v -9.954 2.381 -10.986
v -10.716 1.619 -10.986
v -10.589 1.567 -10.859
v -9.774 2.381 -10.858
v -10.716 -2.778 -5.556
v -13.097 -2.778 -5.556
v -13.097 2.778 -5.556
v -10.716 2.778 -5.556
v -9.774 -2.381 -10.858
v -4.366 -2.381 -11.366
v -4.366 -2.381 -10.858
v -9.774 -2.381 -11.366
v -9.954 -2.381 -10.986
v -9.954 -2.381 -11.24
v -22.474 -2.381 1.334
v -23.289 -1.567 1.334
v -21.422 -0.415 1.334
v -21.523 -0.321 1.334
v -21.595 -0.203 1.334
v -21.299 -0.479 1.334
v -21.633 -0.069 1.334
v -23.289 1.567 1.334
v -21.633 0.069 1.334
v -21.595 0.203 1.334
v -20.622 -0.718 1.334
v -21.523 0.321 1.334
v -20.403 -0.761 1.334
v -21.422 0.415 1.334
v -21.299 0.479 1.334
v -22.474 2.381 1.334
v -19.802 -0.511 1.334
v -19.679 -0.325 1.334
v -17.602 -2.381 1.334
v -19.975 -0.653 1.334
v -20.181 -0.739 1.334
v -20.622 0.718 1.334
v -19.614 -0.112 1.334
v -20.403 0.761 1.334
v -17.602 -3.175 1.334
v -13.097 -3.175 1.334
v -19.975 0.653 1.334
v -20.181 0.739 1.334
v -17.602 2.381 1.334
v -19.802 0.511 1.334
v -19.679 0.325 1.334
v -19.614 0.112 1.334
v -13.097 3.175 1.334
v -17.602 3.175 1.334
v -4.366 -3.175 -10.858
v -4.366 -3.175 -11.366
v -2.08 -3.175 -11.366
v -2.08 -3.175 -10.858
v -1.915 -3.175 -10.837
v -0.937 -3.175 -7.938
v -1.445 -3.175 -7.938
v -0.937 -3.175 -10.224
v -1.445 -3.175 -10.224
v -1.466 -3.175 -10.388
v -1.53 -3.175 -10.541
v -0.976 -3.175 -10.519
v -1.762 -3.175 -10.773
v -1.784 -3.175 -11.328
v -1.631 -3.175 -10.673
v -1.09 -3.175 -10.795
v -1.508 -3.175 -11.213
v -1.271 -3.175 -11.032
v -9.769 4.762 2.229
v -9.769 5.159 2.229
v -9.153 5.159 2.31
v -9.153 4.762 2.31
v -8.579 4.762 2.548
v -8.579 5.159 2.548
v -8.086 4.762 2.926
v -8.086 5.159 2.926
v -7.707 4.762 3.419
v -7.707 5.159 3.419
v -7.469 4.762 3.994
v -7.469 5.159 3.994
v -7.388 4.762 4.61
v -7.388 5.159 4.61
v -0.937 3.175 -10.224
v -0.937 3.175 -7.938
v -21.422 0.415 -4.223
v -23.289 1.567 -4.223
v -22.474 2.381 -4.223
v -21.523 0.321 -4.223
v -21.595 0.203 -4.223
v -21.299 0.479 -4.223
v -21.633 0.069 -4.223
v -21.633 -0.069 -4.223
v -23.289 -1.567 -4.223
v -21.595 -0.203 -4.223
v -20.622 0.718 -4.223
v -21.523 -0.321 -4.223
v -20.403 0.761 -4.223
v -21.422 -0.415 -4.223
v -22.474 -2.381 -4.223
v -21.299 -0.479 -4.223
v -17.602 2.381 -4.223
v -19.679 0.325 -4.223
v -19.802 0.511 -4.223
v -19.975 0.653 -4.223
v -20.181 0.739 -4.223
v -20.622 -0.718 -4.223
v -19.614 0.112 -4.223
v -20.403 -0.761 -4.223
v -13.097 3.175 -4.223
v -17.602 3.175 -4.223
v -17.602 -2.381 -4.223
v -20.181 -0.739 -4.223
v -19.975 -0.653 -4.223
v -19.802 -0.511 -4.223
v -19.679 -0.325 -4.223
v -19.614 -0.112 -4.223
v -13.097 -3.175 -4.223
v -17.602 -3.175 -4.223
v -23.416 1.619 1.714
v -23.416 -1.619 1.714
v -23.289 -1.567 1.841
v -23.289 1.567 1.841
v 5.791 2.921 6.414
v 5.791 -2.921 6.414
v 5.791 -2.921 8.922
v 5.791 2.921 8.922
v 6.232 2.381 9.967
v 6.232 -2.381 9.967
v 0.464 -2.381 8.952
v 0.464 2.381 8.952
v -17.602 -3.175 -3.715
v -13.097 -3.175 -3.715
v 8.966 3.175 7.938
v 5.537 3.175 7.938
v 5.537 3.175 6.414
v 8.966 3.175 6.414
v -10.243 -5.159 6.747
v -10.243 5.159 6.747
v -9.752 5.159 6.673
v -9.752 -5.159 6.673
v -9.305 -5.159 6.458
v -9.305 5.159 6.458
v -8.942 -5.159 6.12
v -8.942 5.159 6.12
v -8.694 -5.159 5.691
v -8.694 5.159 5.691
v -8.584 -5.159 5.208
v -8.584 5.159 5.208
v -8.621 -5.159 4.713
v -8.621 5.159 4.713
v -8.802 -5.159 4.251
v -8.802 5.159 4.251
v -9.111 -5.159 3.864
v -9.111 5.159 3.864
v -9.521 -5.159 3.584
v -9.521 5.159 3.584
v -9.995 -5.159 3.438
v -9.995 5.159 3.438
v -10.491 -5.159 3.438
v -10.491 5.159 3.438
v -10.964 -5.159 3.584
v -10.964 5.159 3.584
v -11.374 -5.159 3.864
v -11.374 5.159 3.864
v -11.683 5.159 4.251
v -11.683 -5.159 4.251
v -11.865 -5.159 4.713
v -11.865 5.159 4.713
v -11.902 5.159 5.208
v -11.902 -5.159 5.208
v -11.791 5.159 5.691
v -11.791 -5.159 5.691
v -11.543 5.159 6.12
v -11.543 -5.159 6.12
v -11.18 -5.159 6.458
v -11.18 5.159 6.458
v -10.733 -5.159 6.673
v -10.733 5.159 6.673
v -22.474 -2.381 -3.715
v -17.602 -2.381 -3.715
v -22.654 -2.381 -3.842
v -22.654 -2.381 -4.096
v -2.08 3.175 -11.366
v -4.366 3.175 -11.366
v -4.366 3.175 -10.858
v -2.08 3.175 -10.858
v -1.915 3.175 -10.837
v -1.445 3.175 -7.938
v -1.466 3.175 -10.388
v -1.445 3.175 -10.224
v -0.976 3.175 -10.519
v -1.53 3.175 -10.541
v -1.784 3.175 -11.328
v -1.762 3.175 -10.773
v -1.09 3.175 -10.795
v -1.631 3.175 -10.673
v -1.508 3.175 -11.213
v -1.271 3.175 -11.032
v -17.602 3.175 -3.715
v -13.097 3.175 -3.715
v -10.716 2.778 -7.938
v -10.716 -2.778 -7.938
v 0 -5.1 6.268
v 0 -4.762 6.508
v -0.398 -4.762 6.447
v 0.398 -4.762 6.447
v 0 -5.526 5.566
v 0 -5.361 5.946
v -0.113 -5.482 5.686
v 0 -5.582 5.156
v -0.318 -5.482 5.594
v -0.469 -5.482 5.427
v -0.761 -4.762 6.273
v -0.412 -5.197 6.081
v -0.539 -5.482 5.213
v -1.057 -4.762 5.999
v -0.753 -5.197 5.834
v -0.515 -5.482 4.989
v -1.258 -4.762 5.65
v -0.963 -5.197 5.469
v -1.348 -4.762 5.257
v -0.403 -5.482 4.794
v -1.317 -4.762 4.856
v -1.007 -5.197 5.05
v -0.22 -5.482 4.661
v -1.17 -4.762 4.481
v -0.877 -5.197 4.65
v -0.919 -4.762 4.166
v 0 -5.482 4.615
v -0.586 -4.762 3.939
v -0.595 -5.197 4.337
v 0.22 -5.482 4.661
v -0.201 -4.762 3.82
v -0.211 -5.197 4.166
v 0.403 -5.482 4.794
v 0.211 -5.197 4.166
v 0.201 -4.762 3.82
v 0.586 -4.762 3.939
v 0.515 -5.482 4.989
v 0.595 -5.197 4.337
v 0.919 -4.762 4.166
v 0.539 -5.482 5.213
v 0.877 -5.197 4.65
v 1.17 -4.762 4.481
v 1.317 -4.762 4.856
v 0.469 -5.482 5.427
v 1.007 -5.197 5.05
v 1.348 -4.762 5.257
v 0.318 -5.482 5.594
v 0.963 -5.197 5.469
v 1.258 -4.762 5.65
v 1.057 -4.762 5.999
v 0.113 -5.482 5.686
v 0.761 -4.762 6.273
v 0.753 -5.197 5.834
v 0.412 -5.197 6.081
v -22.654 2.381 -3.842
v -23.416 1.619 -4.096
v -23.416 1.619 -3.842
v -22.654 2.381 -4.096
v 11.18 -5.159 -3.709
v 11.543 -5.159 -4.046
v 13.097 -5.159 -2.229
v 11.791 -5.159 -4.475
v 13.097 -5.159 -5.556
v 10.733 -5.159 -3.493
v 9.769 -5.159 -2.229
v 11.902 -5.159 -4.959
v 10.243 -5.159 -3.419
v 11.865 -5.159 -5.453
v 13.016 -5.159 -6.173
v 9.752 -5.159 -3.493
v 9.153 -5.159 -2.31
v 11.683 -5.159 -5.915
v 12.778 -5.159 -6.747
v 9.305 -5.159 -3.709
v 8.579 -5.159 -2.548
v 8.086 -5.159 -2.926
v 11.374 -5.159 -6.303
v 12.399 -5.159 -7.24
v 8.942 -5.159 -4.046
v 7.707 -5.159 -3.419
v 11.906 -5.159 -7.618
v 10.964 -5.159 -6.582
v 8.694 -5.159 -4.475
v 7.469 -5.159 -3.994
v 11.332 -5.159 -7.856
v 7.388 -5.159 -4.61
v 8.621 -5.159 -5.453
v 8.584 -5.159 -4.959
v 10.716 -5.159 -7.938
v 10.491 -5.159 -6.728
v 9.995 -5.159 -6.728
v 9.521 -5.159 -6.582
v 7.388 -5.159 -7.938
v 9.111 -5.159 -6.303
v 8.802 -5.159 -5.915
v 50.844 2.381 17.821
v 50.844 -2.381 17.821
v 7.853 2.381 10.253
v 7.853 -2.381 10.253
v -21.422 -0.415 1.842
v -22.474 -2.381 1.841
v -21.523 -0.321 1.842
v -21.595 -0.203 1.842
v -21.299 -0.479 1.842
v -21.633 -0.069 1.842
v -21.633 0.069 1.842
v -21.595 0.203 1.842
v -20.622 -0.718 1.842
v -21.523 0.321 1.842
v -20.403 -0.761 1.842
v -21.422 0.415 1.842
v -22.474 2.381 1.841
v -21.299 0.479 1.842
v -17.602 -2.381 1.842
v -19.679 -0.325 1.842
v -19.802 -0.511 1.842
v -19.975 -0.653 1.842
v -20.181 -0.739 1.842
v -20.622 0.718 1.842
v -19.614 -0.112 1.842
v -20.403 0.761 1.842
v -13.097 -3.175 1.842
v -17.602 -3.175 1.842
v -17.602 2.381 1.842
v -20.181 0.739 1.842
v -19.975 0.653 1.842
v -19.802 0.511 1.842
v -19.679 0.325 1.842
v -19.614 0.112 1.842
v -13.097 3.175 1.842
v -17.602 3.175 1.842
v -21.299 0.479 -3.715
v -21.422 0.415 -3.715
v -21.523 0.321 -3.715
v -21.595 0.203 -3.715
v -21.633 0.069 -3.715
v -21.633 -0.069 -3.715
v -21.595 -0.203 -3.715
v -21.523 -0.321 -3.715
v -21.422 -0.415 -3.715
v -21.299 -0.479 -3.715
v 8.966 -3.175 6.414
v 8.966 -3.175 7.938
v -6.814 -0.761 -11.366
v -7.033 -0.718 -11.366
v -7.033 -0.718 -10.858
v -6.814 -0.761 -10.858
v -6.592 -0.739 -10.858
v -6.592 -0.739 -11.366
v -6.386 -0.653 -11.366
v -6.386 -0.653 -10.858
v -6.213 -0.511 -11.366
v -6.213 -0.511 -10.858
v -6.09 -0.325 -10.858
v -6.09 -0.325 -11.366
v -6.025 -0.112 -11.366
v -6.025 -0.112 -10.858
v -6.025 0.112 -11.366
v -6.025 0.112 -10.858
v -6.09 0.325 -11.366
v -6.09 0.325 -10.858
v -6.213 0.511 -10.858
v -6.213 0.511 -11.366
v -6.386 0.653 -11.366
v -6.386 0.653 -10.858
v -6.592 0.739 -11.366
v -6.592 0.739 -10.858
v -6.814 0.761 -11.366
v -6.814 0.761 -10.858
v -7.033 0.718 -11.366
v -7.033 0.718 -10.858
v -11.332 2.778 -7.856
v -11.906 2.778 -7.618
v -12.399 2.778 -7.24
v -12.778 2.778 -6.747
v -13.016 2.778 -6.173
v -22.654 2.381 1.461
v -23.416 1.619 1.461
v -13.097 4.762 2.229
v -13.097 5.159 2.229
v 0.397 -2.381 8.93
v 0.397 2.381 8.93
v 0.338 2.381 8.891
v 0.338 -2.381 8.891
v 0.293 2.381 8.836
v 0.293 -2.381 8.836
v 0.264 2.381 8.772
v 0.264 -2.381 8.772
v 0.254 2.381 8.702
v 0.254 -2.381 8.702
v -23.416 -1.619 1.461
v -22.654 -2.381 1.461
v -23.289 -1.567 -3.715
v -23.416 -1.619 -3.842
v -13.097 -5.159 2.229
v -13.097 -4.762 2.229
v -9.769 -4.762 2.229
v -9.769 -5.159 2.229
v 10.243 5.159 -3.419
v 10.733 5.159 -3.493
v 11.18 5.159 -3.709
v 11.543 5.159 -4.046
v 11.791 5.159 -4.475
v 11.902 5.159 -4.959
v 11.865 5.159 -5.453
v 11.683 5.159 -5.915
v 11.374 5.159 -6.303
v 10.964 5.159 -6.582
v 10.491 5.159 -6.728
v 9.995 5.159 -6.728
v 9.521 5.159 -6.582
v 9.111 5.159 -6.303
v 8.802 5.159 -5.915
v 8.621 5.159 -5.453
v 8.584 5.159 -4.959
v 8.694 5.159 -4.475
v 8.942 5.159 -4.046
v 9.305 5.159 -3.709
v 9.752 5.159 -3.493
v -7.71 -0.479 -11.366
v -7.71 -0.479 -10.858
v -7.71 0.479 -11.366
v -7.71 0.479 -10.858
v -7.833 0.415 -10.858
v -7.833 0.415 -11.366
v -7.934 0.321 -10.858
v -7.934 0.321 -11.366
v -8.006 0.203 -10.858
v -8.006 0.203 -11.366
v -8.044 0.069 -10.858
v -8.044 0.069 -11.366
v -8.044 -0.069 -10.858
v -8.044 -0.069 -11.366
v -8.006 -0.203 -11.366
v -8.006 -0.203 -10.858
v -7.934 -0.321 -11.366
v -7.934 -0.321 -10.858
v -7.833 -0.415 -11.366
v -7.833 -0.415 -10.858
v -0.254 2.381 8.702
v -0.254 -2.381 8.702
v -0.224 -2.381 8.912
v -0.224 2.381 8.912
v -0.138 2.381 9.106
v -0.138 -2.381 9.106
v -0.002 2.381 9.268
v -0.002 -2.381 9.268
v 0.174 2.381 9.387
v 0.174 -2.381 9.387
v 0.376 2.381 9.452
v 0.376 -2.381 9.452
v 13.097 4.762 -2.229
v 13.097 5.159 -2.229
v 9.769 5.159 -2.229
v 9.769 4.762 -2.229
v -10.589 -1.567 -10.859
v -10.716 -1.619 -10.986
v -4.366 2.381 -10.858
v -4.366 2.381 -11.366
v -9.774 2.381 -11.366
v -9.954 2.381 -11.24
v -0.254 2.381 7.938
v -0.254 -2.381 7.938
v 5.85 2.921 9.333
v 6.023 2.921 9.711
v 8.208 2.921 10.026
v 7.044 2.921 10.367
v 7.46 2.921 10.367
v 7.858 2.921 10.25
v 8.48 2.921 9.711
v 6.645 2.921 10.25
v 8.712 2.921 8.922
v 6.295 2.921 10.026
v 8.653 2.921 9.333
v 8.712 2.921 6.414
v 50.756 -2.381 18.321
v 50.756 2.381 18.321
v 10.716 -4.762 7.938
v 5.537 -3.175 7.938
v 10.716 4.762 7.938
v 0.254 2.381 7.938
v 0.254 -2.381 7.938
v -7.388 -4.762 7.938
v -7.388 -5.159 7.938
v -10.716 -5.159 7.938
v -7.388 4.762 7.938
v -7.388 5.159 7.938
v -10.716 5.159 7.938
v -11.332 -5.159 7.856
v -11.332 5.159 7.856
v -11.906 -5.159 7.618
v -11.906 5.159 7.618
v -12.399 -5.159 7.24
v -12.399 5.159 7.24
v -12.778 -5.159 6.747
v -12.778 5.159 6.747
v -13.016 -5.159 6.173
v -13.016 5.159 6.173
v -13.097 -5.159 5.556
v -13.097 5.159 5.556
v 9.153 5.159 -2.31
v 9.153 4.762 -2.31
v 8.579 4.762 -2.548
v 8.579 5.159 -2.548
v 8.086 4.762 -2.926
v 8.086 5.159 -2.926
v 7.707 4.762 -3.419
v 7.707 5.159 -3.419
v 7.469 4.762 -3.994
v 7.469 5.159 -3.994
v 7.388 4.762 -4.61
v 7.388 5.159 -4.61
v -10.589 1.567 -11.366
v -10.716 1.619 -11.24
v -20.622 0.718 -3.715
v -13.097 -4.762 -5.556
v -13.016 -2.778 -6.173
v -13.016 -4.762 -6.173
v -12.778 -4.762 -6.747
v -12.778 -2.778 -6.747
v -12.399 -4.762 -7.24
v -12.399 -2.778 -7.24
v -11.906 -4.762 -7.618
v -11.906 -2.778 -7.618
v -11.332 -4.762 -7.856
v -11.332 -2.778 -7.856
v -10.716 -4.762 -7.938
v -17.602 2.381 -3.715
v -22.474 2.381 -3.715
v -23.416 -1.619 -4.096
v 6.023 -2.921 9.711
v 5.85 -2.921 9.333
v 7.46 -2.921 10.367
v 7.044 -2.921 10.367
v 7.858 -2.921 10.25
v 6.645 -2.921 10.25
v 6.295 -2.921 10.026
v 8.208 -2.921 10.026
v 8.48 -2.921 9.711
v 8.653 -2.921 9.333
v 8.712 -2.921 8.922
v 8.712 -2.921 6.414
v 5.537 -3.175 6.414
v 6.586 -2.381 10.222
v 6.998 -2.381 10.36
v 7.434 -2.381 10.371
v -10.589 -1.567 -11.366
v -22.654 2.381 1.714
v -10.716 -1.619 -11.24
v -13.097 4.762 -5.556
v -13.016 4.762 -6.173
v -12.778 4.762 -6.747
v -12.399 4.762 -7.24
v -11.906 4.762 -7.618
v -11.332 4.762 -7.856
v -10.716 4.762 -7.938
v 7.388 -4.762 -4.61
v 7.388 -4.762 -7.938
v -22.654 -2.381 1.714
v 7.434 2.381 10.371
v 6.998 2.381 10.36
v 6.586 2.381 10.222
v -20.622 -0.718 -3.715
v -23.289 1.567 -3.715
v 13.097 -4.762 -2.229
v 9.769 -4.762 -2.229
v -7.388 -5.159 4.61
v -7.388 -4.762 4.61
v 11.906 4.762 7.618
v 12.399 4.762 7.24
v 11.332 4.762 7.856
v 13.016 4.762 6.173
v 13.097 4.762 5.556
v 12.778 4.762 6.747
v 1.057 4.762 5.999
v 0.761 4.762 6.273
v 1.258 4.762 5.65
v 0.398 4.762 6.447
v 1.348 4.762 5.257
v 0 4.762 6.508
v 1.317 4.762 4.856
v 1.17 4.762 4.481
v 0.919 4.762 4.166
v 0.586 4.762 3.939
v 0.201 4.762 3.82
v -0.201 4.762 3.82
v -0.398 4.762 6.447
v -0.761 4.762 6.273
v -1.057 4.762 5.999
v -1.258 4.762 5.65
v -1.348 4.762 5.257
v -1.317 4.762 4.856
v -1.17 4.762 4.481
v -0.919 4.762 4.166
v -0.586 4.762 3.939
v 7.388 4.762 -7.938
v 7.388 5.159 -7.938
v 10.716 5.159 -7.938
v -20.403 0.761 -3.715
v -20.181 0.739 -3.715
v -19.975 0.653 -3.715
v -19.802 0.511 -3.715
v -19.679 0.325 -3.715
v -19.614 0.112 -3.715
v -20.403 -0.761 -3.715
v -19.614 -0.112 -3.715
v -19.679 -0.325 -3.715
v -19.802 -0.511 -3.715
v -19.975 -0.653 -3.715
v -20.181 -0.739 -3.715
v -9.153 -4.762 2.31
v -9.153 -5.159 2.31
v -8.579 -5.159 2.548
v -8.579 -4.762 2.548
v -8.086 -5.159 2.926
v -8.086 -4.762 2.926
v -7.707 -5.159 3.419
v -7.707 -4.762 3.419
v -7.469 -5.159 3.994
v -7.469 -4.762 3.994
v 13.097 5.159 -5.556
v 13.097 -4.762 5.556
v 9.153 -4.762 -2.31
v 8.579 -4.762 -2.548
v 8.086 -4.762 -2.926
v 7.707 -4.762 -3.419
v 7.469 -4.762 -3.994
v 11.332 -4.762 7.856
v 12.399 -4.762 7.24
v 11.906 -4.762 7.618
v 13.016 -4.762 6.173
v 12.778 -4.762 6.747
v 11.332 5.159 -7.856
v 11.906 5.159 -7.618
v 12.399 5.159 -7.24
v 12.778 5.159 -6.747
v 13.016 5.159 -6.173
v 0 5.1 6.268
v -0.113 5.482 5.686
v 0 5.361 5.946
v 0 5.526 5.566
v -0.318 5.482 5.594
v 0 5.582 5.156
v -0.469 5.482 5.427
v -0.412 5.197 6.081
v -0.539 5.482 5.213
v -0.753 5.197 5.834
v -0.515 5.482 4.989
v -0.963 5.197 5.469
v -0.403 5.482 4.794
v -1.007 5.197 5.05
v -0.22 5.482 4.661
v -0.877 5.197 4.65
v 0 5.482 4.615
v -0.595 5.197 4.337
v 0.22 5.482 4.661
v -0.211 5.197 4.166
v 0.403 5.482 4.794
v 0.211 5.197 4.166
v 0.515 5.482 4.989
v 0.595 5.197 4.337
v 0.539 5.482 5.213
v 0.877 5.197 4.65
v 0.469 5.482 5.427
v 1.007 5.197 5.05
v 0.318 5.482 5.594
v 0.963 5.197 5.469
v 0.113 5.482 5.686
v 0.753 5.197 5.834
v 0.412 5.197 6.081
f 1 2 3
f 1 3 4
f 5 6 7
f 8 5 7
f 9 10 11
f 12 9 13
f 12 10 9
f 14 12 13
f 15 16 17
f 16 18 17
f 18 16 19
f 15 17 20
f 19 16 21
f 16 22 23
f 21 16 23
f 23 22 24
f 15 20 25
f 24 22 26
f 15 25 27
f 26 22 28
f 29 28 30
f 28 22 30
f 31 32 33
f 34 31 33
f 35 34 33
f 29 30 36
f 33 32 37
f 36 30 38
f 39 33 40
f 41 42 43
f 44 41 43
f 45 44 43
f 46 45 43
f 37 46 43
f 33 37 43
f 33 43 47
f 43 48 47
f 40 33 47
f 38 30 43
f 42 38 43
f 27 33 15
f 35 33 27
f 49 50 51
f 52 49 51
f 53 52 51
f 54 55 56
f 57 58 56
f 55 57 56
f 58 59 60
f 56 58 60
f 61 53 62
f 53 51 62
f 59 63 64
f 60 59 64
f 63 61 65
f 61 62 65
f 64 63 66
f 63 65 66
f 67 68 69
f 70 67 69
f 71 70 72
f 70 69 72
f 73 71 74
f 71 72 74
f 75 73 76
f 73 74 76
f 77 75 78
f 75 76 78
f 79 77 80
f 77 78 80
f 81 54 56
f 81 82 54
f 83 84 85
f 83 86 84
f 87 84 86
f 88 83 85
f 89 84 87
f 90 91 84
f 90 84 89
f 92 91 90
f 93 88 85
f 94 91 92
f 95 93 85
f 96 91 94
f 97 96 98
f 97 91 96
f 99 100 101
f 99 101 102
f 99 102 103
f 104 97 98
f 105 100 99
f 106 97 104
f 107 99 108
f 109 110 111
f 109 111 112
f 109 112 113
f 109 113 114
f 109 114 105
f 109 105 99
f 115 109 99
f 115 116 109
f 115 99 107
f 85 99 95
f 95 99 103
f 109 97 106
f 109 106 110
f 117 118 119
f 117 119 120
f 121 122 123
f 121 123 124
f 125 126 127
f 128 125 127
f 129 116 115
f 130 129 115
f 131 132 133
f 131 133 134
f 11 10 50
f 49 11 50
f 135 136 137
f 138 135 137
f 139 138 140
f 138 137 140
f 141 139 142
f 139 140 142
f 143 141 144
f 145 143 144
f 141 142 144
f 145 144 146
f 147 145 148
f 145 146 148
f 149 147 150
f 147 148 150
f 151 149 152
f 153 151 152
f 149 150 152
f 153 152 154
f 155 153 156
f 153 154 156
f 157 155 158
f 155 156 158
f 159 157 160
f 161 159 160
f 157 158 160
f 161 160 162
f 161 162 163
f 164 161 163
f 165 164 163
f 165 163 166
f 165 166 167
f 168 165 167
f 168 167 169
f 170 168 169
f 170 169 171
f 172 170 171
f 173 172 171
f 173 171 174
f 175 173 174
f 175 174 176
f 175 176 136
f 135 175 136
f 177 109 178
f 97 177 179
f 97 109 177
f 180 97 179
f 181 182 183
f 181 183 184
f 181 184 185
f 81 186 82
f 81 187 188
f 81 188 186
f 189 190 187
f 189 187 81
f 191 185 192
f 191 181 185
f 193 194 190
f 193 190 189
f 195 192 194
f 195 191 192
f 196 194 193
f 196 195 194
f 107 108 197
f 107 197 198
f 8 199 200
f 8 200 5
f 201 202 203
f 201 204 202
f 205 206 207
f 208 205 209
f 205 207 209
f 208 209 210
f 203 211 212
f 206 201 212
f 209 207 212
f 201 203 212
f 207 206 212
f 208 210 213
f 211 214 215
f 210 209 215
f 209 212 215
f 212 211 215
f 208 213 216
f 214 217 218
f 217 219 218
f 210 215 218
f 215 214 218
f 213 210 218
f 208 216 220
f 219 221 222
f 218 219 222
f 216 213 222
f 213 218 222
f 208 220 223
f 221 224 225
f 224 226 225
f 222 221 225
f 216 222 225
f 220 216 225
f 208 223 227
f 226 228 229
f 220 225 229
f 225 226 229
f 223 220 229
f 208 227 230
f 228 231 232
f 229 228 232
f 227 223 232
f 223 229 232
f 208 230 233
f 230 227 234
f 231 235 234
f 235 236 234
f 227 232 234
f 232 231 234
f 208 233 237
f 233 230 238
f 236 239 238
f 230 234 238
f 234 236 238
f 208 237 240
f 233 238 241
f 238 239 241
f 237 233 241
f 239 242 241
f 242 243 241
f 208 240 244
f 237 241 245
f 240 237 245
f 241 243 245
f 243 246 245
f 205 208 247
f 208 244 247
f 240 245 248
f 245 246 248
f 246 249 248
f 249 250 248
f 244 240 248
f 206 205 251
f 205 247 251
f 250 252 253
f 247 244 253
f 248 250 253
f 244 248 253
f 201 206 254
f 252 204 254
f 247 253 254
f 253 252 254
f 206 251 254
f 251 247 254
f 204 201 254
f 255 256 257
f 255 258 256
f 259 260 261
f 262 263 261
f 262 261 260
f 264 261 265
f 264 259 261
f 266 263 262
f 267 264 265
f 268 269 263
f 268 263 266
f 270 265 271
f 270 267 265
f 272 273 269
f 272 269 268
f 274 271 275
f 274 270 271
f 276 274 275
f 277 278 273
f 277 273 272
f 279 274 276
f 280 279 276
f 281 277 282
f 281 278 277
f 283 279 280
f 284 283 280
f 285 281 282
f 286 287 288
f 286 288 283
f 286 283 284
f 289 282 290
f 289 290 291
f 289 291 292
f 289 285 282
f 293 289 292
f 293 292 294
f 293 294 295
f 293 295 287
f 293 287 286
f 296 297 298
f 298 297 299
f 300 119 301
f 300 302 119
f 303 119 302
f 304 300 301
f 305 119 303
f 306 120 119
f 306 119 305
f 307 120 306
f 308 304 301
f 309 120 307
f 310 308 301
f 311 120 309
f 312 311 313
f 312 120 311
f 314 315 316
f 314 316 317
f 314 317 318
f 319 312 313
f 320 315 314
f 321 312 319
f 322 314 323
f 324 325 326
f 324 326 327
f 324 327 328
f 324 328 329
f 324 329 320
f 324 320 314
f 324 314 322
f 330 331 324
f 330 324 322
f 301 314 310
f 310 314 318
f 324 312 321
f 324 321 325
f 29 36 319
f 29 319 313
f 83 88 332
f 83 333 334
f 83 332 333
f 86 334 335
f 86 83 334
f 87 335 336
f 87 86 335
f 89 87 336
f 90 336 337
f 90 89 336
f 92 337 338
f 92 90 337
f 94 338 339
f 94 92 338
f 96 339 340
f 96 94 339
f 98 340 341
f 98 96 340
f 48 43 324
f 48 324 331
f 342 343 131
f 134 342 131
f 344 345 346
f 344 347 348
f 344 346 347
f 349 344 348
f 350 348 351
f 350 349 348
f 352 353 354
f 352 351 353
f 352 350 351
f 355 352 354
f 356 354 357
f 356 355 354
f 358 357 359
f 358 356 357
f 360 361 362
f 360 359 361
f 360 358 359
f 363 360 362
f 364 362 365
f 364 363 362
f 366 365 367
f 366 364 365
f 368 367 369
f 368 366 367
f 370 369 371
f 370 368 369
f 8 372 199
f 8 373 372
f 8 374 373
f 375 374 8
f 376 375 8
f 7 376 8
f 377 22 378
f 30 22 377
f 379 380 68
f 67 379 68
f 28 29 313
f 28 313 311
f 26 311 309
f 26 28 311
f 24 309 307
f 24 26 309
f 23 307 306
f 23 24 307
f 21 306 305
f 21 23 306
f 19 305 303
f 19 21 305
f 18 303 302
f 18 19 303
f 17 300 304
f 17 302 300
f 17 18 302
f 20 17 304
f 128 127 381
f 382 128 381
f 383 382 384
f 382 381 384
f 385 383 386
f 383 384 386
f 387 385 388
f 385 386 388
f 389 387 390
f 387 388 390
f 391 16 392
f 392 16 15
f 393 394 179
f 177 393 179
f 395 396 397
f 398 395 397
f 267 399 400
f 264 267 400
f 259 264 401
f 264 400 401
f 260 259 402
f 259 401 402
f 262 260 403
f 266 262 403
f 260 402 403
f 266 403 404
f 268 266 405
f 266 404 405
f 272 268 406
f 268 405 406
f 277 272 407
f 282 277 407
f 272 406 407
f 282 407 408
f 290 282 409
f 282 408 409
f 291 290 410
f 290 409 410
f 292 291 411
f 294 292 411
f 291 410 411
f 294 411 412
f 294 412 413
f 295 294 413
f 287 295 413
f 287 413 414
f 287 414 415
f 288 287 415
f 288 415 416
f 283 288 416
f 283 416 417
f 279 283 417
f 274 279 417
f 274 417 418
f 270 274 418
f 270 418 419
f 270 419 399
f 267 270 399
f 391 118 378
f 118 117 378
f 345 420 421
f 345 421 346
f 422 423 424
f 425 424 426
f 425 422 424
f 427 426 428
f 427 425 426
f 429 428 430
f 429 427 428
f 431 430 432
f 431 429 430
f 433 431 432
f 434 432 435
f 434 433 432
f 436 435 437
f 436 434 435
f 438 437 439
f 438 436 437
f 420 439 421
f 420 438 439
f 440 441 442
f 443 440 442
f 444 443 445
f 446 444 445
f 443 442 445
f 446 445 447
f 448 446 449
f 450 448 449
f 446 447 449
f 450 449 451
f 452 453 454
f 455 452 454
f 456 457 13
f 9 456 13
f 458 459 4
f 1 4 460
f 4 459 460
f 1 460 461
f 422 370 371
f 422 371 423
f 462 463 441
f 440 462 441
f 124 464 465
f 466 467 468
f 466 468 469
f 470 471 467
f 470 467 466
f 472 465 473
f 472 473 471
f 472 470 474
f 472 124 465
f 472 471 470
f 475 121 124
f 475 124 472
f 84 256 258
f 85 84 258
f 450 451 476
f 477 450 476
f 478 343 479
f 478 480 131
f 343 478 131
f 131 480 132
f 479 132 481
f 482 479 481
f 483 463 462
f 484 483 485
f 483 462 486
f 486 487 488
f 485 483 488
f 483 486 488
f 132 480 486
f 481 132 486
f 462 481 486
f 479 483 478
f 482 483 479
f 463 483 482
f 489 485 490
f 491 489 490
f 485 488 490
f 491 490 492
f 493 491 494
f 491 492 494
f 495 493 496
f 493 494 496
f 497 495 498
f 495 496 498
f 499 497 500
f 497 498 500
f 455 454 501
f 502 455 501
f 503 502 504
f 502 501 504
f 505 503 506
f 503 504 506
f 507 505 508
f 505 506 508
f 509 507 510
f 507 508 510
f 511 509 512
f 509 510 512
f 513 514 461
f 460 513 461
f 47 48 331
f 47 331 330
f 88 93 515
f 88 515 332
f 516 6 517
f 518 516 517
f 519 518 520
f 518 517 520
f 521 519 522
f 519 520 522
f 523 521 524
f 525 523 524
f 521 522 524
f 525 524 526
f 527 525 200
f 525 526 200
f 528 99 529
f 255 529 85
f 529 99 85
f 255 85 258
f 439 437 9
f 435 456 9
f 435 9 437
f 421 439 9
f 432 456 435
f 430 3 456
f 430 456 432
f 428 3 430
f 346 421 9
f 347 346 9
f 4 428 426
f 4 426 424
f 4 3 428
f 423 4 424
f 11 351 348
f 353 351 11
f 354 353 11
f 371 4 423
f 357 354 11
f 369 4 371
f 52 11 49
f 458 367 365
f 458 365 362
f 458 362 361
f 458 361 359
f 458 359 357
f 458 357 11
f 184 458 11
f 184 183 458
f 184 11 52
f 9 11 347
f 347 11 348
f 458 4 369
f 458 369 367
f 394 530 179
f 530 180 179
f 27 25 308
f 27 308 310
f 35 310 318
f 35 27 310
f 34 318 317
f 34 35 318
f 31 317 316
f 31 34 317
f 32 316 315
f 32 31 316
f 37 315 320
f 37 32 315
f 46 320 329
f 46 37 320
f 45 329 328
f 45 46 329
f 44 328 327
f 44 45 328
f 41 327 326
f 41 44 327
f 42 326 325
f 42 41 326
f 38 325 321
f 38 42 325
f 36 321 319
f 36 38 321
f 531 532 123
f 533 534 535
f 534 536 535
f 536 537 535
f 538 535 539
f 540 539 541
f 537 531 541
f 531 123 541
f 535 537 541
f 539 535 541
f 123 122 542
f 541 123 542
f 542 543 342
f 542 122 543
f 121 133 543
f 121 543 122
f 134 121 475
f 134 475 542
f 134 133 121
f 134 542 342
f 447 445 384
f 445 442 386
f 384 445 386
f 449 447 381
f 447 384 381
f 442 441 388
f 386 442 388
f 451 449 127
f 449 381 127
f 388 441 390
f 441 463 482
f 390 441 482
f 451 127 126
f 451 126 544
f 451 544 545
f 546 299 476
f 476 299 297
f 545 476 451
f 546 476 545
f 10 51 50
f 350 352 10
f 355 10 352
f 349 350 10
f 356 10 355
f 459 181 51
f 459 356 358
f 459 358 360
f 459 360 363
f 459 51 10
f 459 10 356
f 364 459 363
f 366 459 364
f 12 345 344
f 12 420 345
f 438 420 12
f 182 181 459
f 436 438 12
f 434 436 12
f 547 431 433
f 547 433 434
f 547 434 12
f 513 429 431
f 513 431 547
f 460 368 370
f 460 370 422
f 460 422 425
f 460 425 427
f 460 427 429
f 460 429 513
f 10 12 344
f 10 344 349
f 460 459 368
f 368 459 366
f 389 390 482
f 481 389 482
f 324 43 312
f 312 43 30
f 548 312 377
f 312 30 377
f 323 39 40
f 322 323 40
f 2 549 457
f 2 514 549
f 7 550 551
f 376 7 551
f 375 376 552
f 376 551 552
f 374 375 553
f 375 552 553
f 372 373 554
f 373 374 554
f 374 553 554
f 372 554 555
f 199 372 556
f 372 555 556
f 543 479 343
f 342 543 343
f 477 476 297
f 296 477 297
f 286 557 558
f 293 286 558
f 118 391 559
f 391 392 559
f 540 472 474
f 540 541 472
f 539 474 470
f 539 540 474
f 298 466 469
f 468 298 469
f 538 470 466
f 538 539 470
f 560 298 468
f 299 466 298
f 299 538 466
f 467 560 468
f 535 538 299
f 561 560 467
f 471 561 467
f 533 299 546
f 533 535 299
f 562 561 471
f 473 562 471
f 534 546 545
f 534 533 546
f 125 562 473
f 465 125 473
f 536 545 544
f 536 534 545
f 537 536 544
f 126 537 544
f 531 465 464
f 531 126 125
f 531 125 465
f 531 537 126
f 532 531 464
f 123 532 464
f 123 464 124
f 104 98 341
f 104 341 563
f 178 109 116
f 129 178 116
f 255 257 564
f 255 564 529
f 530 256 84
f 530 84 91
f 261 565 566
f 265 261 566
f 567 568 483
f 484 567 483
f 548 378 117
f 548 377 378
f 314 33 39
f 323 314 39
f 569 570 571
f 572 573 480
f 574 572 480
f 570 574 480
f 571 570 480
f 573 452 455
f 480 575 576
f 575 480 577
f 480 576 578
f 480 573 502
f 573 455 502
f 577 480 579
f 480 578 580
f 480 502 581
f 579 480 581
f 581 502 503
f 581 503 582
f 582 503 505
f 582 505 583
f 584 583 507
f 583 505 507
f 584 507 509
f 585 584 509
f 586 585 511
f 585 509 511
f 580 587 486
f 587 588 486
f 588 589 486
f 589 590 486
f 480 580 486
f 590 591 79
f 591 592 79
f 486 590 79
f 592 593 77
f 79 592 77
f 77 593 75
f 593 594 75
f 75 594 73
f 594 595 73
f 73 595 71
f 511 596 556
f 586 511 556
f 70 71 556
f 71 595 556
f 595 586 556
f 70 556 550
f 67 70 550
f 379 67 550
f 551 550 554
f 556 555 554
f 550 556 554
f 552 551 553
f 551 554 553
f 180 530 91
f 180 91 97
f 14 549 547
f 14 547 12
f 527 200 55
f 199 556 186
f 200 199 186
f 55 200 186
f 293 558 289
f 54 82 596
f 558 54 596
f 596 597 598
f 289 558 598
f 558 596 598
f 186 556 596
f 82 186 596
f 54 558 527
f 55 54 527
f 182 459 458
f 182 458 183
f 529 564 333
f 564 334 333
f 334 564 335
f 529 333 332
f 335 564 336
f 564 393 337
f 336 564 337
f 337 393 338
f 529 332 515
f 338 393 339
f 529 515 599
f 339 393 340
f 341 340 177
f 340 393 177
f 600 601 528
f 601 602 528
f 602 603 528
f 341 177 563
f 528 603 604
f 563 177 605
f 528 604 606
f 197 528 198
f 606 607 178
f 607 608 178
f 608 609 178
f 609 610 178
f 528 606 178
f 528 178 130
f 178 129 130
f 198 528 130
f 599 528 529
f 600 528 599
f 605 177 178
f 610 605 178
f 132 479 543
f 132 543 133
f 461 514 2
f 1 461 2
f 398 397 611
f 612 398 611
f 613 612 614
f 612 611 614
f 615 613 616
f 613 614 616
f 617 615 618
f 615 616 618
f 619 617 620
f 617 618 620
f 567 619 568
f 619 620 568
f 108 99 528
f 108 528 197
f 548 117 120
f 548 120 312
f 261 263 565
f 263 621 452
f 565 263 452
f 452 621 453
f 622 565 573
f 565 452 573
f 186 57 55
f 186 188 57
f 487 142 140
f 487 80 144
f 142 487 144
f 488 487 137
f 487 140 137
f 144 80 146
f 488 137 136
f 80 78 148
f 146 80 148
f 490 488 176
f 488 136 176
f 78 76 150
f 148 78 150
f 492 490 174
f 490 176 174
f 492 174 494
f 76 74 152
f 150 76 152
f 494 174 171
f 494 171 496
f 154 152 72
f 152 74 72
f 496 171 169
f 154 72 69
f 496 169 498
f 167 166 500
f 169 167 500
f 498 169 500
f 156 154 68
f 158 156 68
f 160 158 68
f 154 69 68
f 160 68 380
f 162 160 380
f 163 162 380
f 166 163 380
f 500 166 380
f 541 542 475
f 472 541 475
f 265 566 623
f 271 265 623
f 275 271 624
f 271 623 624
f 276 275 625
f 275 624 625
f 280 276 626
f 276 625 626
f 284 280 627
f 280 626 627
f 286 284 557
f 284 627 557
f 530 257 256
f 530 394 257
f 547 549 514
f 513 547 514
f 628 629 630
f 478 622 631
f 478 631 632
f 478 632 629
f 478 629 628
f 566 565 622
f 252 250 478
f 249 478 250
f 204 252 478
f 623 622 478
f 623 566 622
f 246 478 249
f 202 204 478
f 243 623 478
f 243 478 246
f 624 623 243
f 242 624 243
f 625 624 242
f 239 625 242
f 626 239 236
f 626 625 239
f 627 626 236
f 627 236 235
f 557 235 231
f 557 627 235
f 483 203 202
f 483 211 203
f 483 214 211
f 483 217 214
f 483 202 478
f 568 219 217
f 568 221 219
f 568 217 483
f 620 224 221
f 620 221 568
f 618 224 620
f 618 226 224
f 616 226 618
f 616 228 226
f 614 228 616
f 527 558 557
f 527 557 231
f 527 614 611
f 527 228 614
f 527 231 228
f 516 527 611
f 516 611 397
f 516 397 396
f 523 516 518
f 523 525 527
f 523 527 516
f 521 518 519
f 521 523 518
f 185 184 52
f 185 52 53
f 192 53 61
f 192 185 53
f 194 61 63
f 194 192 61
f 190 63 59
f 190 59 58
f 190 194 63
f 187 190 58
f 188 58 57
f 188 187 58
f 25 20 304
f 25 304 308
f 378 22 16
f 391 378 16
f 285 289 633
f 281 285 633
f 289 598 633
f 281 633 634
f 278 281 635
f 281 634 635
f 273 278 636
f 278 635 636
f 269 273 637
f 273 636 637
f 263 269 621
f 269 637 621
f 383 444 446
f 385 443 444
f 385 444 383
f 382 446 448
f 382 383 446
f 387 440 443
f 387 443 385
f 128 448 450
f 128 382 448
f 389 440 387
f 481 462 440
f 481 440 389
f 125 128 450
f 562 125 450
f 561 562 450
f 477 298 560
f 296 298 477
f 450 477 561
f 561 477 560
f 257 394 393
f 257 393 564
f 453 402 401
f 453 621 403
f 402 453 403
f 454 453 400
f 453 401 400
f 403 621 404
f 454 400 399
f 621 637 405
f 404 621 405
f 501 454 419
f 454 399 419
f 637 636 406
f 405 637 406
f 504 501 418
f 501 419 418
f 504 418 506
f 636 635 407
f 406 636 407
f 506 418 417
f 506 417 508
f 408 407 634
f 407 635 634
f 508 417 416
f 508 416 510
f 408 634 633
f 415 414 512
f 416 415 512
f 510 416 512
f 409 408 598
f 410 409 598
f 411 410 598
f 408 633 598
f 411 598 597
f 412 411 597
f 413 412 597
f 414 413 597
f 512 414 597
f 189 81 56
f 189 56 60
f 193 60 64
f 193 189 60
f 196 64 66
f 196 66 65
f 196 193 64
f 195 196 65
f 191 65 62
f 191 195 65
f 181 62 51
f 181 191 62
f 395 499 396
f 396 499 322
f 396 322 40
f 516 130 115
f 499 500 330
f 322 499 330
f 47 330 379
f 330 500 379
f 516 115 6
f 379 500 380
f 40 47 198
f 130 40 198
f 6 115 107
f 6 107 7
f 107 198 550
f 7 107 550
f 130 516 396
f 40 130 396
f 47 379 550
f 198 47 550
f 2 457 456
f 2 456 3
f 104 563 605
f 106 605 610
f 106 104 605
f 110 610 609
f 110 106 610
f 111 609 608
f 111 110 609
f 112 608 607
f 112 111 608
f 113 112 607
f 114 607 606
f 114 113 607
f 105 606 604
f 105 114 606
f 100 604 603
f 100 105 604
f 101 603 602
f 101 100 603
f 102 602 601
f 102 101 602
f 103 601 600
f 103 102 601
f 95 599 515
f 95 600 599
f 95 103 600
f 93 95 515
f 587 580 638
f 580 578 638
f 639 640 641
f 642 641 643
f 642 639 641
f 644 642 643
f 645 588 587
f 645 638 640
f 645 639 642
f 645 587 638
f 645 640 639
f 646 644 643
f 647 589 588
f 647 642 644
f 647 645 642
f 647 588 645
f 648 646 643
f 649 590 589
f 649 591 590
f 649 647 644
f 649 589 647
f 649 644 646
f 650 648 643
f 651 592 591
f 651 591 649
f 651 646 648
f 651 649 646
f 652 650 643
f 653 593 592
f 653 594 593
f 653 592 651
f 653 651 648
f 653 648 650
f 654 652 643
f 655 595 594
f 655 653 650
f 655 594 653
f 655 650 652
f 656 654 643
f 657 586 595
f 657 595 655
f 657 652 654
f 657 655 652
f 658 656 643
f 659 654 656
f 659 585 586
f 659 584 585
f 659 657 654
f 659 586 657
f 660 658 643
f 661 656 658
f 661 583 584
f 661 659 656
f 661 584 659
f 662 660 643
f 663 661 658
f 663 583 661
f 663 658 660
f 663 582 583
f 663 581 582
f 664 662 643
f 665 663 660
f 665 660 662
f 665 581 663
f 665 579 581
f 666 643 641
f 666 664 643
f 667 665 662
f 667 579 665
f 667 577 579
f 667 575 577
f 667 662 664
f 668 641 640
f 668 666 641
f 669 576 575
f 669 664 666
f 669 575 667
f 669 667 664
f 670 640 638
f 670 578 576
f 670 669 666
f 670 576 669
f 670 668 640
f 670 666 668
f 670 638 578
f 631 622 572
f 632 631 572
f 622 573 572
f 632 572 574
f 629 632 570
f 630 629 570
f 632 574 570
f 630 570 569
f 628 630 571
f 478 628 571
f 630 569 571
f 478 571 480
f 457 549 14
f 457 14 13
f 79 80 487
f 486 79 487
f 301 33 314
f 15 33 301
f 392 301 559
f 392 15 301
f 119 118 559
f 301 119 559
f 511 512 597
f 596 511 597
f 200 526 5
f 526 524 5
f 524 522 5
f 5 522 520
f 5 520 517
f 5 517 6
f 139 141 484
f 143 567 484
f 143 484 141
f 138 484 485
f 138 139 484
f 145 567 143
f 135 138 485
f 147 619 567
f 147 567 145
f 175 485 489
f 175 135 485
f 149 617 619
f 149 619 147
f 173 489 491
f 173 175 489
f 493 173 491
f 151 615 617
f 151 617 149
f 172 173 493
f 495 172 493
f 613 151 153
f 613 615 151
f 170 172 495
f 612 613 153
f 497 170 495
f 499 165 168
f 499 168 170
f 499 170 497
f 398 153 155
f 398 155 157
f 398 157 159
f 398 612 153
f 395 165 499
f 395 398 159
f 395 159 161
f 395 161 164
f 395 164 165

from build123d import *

# Parameters (mm, degrees)
BOSS_EXTRUDE1_DEPTH = 4.7625
BOSS_EXTRUDE2_DEPTH = 5.159375
BOSS_EXTRUDE3_DEPTH = 5.159375
SKETCH4_R           = 1.6637
CUT_EXTRUDE1_DEPTH  = 19.466419322
SKETCH5_W           = 2.38125
SKETCH5_H           = 5.55625
CUT_EXTRUDE2_DEPTH  = 2.38125
EXTRUDE_THIN1_DEPTH = 3.175
CUT_EXTRUDE3_REACH  = 25.891
SKETCH7_W           = 6.35
SKETCH7_H           = 0.79375
SKETCH8_W           = 10.31875
SKETCH8_H           = 0.508
EXTRUDE_THIN2_DEPTH = 3.175
SKETCH9_W           = 5.813488842
SKETCH9_H           = 0.79375
CUT_EXTRUDE4_DEPTH  = 72.39
CUT_EXTRUDE5_REACH  = 32.782
CUT_EXTRUDE6_DEPTH  = 27.884611297
CHAMFER1_SIZE       = 0.762
CHAMFER2_SIZE       = 0.127
SKETCH12_W          = 3.429
SKETCH12_H          = 6.35
CUT_EXTRUDE7_DEPTH  = 1.524
SKETCH13_W          = 2.921
SKETCH13_H          = 5.842
BOSS_EXTRUDE4_DEPTH = 3.96875
FILLET1_RADIUS      = 1.4605
FILLET1_LENGTH      = 5.842
EXTRUDE_THIN5_START = -2.38125
EXTRUDE_THIN5_DEPTH = 4.7625


# Read off the part's stored shape, not the designer's step: Extrude-Thin5
with BuildPart() as part:
    # Sketch1 → Boss-Extrude1 (new, symmetric)
    with BuildSketch(Plane(origin=(0, 0, 0), x_dir=(1, 0, 0), z_dir=(0, 1, 0))):
        with BuildLine():
            Line((-10.715625, 7.9375), (10.715625, 7.9375))
            ThreePointArc((10.715625, 7.9375), (12.399423023, 7.240048023), (13.096875, 5.55625))
            Line((13.096875, 5.55625), (13.096875, -5.55625))
            ThreePointArc((13.096875, -5.55625), (12.399423023, -7.240048023), (10.715625, -7.9375))
            Line((10.715625, -7.9375), (-10.715625, -7.9375))
            ThreePointArc((-10.715625, -7.9375), (-12.399423023, -7.240048023), (-13.096875, -5.55625))
            Line((-13.096875, -5.55625), (-13.096875, 5.55625))
            ThreePointArc((-13.096875, 5.55625), (-12.399423023, 7.240048023), (-10.715625, 7.9375))
        make_face()
    extrude(amount=BOSS_EXTRUDE1_DEPTH, both=True)

    # Sketch2 → Boss-Extrude2 (add, symmetric)
    with BuildSketch(Plane(origin=(0, 0, 0), x_dir=(1, 0, 0), z_dir=(0, 1, 0))):
        with BuildLine():
            Line((7.388225, 7.9375), (10.715625, 7.9375))
            ThreePointArc((10.715625, 7.9375), (12.399423023, 7.240048023), (13.096875, 5.55625))
            Line((13.096875, 5.55625), (13.096875, 2.22885))
            Line((13.096875, 2.22885), (9.769475, 2.22885))
            ThreePointArc((9.769475, 2.22885), (8.085676977, 2.926301977), (7.388225, 4.6101))
            Line((7.388225, 4.6101), (7.388225, 7.9375))
        make_face()
    extrude(amount=BOSS_EXTRUDE2_DEPTH, both=True)

    # Sketch3 → Boss-Extrude3 (add, symmetric)
    with BuildSketch(Plane(origin=(0, 0, 0), x_dir=(1, 0, 0), z_dir=(0, 1, 0))):
        with BuildLine():
            Line((-7.388225, -7.9375), (-10.715625, -7.9375))
            ThreePointArc((-10.715625, -7.9375), (-12.399423023, -7.240048023), (-13.096875, -5.55625))
            Line((-13.096875, -5.55625), (-13.096875, -2.22885))
            Line((-13.096875, -2.22885), (-9.769475, -2.22885))
            ThreePointArc((-9.769475, -2.22885), (-8.085676977, -2.926301977), (-7.388225, -4.6101))
            Line((-7.388225, -4.6101), (-7.388225, -7.9375))
        make_face()
    extrude(amount=BOSS_EXTRUDE3_DEPTH, both=True)

    # Sketch4 → Cut-Extrude1 (cut, through all)
    with BuildSketch(Plane(origin=(0, 5.159375, 0), x_dir=(1, 0, 0), z_dir=(0, 1, 0))):
        with Locations(Location((-10.24255, -5.083175, 0), (0, 0, 270))):
            Circle(SKETCH4_R)
        with Locations(Location((10.24255, 5.083175, 0), (0, 0, 270))):
            Circle(SKETCH4_R)
    extrude(amount=-CUT_EXTRUDE1_DEPTH, mode=Mode.SUBTRACT)

    # Sketch5 → Cut-Extrude2 (cut)
    with BuildSketch(Plane.ZY.offset(13.096875)):
        with Locations((-6.746875, 0)):
            Rectangle(SKETCH5_W, SKETCH5_H)
    extrude(amount=-CUT_EXTRUDE2_DEPTH, mode=Mode.SUBTRACT)

    # Sketch6 → Extrude-Thin1 (add, symmetric)
    with BuildSketch(Plane(origin=(0, 0, 0), x_dir=(1, 0, 0), z_dir=(0, 1, 0))):
        with BuildLine():
            Line((-0.936625, 7.9375), (-0.936625, 10.2235))
            ThreePointArc((-0.936625, 10.2235), (-1.271401949, 11.031723051), (-2.079625, 11.3665))
            Line((-2.079625, 11.3665), (-10.715625, 11.3665))
            Line((-10.715625, 11.3665), (-10.715625, 10.8585))
            Line((-10.715625, 10.8585), (-2.079625, 10.8585))
            ThreePointArc((-2.079625, 10.8585), (-1.630612194, 10.672512806), (-1.444625, 10.2235))
            Line((-1.444625, 10.2235), (-1.444625, 7.9375))
            Line((-1.444625, 7.9375), (-0.936625, 7.9375))
        make_face()
    extrude(amount=EXTRUDE_THIN1_DEPTH, both=True)

    # Sketch7 → Cut-Extrude3 (cut, up to next)
    with BuildSketch(Plane(origin=(0, 0, -11.3665), x_dir=(-1, 0, 0), z_dir=(0, 0, -1)), mode=Mode.PRIVATE) as cut_extrude3_sk1:
        with Locations((7.540625, 2.778125)):
            Rectangle(SKETCH7_W, SKETCH7_H)
    cut_extrude3_tool1 = extrude(cut_extrude3_sk1.sketch, amount=-CUT_EXTRUDE3_REACH, mode=Mode.PRIVATE) & part.part
    cut_extrude3 = cut_extrude3_tool1.solids().sort_by_distance((-7.540625, 2.778125, -11.3665))[0]
    add(cut_extrude3, mode=Mode.SUBTRACT)

    # Sketch8 → Extrude-Thin2 (add, symmetric)
    with BuildSketch(Plane(origin=(0, 0, 0), x_dir=(1, 0, 0), z_dir=(0, 1, 0))):
        with Locations((-18.25625, 3.96875)):
            Rectangle(SKETCH8_W, SKETCH8_H)
        with Locations((-18.25625, -1.5875)):
            Rectangle(SKETCH8_W, SKETCH8_H)
    extrude(amount=EXTRUDE_THIN2_DEPTH, both=True)

    # Sketch9 → Cut-Extrude4 (cut)
    with BuildSketch(Plane(origin=(0, 0, -4.22275), x_dir=(-1, 0, 0), z_dir=(0, 0, -1))):
        with Locations((20.508880579, 2.778125)):
            Rectangle(SKETCH9_W, SKETCH9_H)
    cut_extrude4 = extrude(amount=-CUT_EXTRUDE4_DEPTH, mode=Mode.SUBTRACT)

    # Mirror1: Cut-Extrude3, Cut-Extrude4 across plane
    add(cut_extrude3.mirror(Plane.ZX), mode=Mode.SUBTRACT)
    add(cut_extrude4.mirror(Plane.ZX), mode=Mode.SUBTRACT)

    # Sketch10 → Cut-Extrude5 (cut, up to next)
    with BuildSketch(Plane(origin=(0, 0, -11.3665), x_dir=(-1, 0, 0), z_dir=(0, 0, -1)), mode=Mode.PRIVATE) as cut_extrude5_sk1:
        with BuildLine():
            Line((7.032625, 0.71842049), (7.709958333, 0.478946993))
            ThreePointArc((7.709958333, 0.478946993), (8.048625, 0), (7.709958333, -0.478946993))
            Line((7.709958333, -0.478946993), (7.032625, -0.71842049))
            ThreePointArc((7.032625, -0.71842049), (6.016625, 0), (7.032625, 0.71842049))
        make_face()
    cut_extrude5_tool1 = extrude(cut_extrude5_sk1.sketch, amount=-CUT_EXTRUDE5_REACH, mode=Mode.PRIVATE) & part.part
    add(cut_extrude5_tool1.solids().sort_by_distance((-6.978953, 0, -11.3665))[0], mode=Mode.SUBTRACT)

    # Sketch11 → Cut-Extrude6 (cut, through all)
    with BuildSketch(Plane(origin=(0, 0, -4.22275), x_dir=(-1, 0, 0), z_dir=(0, 0, -1))):
        with BuildLine():
            Line((20.621625, 0.71842049), (21.298958333, 0.478946993))
            ThreePointArc((21.298958333, 0.478946993), (21.637625, 0), (21.298958333, -0.478946993))
            Line((21.298958333, -0.478946993), (20.621625, -0.71842049))
            ThreePointArc((20.621625, -0.71842049), (19.605625, 0), (20.621625, 0.71842049))
        make_face()
    extrude(amount=-CUT_EXTRUDE6_DEPTH, mode=Mode.SUBTRACT)

    # Chamfer1
    chamfer1_edges = [part.edges().sort_by_distance(p)[0] for p in [
        (-10.715625, 2.38125, -11.1125),
        (-23.415625, 2.38125, 1.5875),
        (-23.415625, 2.38125, -3.96875),
        (-10.715625, -2.38125, -11.1125),
        (-23.415625, -2.38125, 1.5875),
        (-23.415625, -2.38125, -3.96875),
    ]]
    chamfer(chamfer1_edges, length=CHAMFER1_SIZE)

    # Chamfer2
    chamfer2_edges = [part.edges().sort_by_distance(p)[0] for p in [
        (-10.715625, 0, -11.3665),
        (-10.715625, 0, -10.8585),
        (-10.334625, -2.00025, -11.3665),
        (-10.334625, 2.00025, -11.3665),
        (-10.334625, -2.00025, -10.8585),
        (-10.334625, 2.00025, -10.8585),
        (-23.415625, 0, 1.3335),
        (-23.034625, 2.00025, 1.3335),
        (-23.034625, -2.00025, 1.3335),
        (-23.415625, 0, 1.8415),
        (-23.034625, 2.00025, 1.8415),
        (-23.034625, -2.00025, 1.8415),
        (-23.415625, 0, -4.22275),
        (-23.415625, 0, -3.71475),
        (-23.034625, -2.00025, -4.22275),
        (-23.034625, 2.00025, -4.22275),
        (-23.034625, -2.00025, -3.71475),
        (-23.034625, 2.00025, -3.71475),
    ]]
    chamfer(chamfer2_edges, length=CHAMFER2_SIZE)

    # Sketch12 → Cut-Extrude7 (cut)
    with BuildSketch(Plane.XY.offset(7.9375)):
        with Locations((7.2517, 0)):
            Rectangle(SKETCH12_W, SKETCH12_H)
    extrude(amount=-CUT_EXTRUDE7_DEPTH, mode=Mode.SUBTRACT)

    # Sketch13 → Boss-Extrude4 (add)
    with BuildSketch(Plane.XY.offset(6.4135)):
        with Locations((7.2517, 0)):
            Rectangle(SKETCH13_W, SKETCH13_H)
    extrude(amount=BOSS_EXTRUDE4_DEPTH)

    # Fillet1: full round fillet: the end face becomes a half cylinder, R = half its width
    fillet1_face = Plane((7.2517, 0, 10.38225), x_dir=(0, -1, 0), z_dir=(0, 0, 1))  # on the end face: x along it, z out of the body
    fillet1_slab = fillet1_face.offset(-FILLET1_RADIUS / 2) * Box(FILLET1_LENGTH, 2 * FILLET1_RADIUS, FILLET1_RADIUS, mode=Mode.PRIVATE)  # the body's end, R deep
    fillet1_round = Plane((7.2517, 0, 8.92175), x_dir=(0, 0, 1), z_dir=(0, -1, 0)) * Cylinder(FILLET1_RADIUS, FILLET1_LENGTH, mode=Mode.PRIVATE)  # its axis R under the face
    add(fillet1_slab - fillet1_round, mode=Mode.SUBTRACT)

    # Sketch14 → Revolve1 (revolve)
    with BuildSketch(Plane(origin=(0, 0, 0), x_dir=(0, 0, -1), z_dir=(1, 0, 0))):
        with BuildLine():
            Line((-5.1562, -4.7625), (-5.1562, -5.581854839))
            ThreePointArc((-5.1562, -5.581854839), (-5.946357191, -5.361015463), (-6.507514618, -4.7625))
            Line((-6.507514618, -4.7625), (-5.1562, -4.7625))
        make_face()
    revolve1 = revolve(axis=Axis((0, -4.7625, 5.1562), (0, -1, 0)))

    # Mirror2: Revolve1 across plane
    add(revolve1.mirror(Plane.ZX))

    # Extrude-Thin5 outline → Extrude-Thin5 (add)
    with BuildSketch(Plane(origin=(0, 0, 0), x_dir=(1, 0, 0), z_dir=(0, 1, 0)).offset(EXTRUDE_THIN5_START)):
        with BuildLine():
            Line((50.755963212, -18.321063831), (50.844036788, -17.82075688))
            Line((50.844036788, -17.82075688), (7.853115161, -10.252674511))
            ThreePointArc((7.853115161, -10.252674511), (6.998488468, -10.360132484), (6.231935352, -9.967283506))
            Line((6.231935352, -9.967283506), (0.463963212, -8.951894987))
            ThreePointArc((0.463963212, -8.951894987), (0.313447508, -8.865036728), (0.254, -8.701741511))
            Line((0.254, -8.701741511), (0.254, -7.9375))
            Line((0.254, -7.9375), (-0.254, -7.9375))
            Line((-0.254, -7.9375), (-0.254, -8.701741511))
            ThreePointArc((-0.254, -8.701741511), (-0.075657476, -9.191627163), (0.375889636, -9.452201938))
            Line((0.375889636, -9.452201938), (50.755963212, -18.321063831))
        make_face()
    extrude(amount=EXTRUDE_THIN5_DEPTH)


solid = part.part
